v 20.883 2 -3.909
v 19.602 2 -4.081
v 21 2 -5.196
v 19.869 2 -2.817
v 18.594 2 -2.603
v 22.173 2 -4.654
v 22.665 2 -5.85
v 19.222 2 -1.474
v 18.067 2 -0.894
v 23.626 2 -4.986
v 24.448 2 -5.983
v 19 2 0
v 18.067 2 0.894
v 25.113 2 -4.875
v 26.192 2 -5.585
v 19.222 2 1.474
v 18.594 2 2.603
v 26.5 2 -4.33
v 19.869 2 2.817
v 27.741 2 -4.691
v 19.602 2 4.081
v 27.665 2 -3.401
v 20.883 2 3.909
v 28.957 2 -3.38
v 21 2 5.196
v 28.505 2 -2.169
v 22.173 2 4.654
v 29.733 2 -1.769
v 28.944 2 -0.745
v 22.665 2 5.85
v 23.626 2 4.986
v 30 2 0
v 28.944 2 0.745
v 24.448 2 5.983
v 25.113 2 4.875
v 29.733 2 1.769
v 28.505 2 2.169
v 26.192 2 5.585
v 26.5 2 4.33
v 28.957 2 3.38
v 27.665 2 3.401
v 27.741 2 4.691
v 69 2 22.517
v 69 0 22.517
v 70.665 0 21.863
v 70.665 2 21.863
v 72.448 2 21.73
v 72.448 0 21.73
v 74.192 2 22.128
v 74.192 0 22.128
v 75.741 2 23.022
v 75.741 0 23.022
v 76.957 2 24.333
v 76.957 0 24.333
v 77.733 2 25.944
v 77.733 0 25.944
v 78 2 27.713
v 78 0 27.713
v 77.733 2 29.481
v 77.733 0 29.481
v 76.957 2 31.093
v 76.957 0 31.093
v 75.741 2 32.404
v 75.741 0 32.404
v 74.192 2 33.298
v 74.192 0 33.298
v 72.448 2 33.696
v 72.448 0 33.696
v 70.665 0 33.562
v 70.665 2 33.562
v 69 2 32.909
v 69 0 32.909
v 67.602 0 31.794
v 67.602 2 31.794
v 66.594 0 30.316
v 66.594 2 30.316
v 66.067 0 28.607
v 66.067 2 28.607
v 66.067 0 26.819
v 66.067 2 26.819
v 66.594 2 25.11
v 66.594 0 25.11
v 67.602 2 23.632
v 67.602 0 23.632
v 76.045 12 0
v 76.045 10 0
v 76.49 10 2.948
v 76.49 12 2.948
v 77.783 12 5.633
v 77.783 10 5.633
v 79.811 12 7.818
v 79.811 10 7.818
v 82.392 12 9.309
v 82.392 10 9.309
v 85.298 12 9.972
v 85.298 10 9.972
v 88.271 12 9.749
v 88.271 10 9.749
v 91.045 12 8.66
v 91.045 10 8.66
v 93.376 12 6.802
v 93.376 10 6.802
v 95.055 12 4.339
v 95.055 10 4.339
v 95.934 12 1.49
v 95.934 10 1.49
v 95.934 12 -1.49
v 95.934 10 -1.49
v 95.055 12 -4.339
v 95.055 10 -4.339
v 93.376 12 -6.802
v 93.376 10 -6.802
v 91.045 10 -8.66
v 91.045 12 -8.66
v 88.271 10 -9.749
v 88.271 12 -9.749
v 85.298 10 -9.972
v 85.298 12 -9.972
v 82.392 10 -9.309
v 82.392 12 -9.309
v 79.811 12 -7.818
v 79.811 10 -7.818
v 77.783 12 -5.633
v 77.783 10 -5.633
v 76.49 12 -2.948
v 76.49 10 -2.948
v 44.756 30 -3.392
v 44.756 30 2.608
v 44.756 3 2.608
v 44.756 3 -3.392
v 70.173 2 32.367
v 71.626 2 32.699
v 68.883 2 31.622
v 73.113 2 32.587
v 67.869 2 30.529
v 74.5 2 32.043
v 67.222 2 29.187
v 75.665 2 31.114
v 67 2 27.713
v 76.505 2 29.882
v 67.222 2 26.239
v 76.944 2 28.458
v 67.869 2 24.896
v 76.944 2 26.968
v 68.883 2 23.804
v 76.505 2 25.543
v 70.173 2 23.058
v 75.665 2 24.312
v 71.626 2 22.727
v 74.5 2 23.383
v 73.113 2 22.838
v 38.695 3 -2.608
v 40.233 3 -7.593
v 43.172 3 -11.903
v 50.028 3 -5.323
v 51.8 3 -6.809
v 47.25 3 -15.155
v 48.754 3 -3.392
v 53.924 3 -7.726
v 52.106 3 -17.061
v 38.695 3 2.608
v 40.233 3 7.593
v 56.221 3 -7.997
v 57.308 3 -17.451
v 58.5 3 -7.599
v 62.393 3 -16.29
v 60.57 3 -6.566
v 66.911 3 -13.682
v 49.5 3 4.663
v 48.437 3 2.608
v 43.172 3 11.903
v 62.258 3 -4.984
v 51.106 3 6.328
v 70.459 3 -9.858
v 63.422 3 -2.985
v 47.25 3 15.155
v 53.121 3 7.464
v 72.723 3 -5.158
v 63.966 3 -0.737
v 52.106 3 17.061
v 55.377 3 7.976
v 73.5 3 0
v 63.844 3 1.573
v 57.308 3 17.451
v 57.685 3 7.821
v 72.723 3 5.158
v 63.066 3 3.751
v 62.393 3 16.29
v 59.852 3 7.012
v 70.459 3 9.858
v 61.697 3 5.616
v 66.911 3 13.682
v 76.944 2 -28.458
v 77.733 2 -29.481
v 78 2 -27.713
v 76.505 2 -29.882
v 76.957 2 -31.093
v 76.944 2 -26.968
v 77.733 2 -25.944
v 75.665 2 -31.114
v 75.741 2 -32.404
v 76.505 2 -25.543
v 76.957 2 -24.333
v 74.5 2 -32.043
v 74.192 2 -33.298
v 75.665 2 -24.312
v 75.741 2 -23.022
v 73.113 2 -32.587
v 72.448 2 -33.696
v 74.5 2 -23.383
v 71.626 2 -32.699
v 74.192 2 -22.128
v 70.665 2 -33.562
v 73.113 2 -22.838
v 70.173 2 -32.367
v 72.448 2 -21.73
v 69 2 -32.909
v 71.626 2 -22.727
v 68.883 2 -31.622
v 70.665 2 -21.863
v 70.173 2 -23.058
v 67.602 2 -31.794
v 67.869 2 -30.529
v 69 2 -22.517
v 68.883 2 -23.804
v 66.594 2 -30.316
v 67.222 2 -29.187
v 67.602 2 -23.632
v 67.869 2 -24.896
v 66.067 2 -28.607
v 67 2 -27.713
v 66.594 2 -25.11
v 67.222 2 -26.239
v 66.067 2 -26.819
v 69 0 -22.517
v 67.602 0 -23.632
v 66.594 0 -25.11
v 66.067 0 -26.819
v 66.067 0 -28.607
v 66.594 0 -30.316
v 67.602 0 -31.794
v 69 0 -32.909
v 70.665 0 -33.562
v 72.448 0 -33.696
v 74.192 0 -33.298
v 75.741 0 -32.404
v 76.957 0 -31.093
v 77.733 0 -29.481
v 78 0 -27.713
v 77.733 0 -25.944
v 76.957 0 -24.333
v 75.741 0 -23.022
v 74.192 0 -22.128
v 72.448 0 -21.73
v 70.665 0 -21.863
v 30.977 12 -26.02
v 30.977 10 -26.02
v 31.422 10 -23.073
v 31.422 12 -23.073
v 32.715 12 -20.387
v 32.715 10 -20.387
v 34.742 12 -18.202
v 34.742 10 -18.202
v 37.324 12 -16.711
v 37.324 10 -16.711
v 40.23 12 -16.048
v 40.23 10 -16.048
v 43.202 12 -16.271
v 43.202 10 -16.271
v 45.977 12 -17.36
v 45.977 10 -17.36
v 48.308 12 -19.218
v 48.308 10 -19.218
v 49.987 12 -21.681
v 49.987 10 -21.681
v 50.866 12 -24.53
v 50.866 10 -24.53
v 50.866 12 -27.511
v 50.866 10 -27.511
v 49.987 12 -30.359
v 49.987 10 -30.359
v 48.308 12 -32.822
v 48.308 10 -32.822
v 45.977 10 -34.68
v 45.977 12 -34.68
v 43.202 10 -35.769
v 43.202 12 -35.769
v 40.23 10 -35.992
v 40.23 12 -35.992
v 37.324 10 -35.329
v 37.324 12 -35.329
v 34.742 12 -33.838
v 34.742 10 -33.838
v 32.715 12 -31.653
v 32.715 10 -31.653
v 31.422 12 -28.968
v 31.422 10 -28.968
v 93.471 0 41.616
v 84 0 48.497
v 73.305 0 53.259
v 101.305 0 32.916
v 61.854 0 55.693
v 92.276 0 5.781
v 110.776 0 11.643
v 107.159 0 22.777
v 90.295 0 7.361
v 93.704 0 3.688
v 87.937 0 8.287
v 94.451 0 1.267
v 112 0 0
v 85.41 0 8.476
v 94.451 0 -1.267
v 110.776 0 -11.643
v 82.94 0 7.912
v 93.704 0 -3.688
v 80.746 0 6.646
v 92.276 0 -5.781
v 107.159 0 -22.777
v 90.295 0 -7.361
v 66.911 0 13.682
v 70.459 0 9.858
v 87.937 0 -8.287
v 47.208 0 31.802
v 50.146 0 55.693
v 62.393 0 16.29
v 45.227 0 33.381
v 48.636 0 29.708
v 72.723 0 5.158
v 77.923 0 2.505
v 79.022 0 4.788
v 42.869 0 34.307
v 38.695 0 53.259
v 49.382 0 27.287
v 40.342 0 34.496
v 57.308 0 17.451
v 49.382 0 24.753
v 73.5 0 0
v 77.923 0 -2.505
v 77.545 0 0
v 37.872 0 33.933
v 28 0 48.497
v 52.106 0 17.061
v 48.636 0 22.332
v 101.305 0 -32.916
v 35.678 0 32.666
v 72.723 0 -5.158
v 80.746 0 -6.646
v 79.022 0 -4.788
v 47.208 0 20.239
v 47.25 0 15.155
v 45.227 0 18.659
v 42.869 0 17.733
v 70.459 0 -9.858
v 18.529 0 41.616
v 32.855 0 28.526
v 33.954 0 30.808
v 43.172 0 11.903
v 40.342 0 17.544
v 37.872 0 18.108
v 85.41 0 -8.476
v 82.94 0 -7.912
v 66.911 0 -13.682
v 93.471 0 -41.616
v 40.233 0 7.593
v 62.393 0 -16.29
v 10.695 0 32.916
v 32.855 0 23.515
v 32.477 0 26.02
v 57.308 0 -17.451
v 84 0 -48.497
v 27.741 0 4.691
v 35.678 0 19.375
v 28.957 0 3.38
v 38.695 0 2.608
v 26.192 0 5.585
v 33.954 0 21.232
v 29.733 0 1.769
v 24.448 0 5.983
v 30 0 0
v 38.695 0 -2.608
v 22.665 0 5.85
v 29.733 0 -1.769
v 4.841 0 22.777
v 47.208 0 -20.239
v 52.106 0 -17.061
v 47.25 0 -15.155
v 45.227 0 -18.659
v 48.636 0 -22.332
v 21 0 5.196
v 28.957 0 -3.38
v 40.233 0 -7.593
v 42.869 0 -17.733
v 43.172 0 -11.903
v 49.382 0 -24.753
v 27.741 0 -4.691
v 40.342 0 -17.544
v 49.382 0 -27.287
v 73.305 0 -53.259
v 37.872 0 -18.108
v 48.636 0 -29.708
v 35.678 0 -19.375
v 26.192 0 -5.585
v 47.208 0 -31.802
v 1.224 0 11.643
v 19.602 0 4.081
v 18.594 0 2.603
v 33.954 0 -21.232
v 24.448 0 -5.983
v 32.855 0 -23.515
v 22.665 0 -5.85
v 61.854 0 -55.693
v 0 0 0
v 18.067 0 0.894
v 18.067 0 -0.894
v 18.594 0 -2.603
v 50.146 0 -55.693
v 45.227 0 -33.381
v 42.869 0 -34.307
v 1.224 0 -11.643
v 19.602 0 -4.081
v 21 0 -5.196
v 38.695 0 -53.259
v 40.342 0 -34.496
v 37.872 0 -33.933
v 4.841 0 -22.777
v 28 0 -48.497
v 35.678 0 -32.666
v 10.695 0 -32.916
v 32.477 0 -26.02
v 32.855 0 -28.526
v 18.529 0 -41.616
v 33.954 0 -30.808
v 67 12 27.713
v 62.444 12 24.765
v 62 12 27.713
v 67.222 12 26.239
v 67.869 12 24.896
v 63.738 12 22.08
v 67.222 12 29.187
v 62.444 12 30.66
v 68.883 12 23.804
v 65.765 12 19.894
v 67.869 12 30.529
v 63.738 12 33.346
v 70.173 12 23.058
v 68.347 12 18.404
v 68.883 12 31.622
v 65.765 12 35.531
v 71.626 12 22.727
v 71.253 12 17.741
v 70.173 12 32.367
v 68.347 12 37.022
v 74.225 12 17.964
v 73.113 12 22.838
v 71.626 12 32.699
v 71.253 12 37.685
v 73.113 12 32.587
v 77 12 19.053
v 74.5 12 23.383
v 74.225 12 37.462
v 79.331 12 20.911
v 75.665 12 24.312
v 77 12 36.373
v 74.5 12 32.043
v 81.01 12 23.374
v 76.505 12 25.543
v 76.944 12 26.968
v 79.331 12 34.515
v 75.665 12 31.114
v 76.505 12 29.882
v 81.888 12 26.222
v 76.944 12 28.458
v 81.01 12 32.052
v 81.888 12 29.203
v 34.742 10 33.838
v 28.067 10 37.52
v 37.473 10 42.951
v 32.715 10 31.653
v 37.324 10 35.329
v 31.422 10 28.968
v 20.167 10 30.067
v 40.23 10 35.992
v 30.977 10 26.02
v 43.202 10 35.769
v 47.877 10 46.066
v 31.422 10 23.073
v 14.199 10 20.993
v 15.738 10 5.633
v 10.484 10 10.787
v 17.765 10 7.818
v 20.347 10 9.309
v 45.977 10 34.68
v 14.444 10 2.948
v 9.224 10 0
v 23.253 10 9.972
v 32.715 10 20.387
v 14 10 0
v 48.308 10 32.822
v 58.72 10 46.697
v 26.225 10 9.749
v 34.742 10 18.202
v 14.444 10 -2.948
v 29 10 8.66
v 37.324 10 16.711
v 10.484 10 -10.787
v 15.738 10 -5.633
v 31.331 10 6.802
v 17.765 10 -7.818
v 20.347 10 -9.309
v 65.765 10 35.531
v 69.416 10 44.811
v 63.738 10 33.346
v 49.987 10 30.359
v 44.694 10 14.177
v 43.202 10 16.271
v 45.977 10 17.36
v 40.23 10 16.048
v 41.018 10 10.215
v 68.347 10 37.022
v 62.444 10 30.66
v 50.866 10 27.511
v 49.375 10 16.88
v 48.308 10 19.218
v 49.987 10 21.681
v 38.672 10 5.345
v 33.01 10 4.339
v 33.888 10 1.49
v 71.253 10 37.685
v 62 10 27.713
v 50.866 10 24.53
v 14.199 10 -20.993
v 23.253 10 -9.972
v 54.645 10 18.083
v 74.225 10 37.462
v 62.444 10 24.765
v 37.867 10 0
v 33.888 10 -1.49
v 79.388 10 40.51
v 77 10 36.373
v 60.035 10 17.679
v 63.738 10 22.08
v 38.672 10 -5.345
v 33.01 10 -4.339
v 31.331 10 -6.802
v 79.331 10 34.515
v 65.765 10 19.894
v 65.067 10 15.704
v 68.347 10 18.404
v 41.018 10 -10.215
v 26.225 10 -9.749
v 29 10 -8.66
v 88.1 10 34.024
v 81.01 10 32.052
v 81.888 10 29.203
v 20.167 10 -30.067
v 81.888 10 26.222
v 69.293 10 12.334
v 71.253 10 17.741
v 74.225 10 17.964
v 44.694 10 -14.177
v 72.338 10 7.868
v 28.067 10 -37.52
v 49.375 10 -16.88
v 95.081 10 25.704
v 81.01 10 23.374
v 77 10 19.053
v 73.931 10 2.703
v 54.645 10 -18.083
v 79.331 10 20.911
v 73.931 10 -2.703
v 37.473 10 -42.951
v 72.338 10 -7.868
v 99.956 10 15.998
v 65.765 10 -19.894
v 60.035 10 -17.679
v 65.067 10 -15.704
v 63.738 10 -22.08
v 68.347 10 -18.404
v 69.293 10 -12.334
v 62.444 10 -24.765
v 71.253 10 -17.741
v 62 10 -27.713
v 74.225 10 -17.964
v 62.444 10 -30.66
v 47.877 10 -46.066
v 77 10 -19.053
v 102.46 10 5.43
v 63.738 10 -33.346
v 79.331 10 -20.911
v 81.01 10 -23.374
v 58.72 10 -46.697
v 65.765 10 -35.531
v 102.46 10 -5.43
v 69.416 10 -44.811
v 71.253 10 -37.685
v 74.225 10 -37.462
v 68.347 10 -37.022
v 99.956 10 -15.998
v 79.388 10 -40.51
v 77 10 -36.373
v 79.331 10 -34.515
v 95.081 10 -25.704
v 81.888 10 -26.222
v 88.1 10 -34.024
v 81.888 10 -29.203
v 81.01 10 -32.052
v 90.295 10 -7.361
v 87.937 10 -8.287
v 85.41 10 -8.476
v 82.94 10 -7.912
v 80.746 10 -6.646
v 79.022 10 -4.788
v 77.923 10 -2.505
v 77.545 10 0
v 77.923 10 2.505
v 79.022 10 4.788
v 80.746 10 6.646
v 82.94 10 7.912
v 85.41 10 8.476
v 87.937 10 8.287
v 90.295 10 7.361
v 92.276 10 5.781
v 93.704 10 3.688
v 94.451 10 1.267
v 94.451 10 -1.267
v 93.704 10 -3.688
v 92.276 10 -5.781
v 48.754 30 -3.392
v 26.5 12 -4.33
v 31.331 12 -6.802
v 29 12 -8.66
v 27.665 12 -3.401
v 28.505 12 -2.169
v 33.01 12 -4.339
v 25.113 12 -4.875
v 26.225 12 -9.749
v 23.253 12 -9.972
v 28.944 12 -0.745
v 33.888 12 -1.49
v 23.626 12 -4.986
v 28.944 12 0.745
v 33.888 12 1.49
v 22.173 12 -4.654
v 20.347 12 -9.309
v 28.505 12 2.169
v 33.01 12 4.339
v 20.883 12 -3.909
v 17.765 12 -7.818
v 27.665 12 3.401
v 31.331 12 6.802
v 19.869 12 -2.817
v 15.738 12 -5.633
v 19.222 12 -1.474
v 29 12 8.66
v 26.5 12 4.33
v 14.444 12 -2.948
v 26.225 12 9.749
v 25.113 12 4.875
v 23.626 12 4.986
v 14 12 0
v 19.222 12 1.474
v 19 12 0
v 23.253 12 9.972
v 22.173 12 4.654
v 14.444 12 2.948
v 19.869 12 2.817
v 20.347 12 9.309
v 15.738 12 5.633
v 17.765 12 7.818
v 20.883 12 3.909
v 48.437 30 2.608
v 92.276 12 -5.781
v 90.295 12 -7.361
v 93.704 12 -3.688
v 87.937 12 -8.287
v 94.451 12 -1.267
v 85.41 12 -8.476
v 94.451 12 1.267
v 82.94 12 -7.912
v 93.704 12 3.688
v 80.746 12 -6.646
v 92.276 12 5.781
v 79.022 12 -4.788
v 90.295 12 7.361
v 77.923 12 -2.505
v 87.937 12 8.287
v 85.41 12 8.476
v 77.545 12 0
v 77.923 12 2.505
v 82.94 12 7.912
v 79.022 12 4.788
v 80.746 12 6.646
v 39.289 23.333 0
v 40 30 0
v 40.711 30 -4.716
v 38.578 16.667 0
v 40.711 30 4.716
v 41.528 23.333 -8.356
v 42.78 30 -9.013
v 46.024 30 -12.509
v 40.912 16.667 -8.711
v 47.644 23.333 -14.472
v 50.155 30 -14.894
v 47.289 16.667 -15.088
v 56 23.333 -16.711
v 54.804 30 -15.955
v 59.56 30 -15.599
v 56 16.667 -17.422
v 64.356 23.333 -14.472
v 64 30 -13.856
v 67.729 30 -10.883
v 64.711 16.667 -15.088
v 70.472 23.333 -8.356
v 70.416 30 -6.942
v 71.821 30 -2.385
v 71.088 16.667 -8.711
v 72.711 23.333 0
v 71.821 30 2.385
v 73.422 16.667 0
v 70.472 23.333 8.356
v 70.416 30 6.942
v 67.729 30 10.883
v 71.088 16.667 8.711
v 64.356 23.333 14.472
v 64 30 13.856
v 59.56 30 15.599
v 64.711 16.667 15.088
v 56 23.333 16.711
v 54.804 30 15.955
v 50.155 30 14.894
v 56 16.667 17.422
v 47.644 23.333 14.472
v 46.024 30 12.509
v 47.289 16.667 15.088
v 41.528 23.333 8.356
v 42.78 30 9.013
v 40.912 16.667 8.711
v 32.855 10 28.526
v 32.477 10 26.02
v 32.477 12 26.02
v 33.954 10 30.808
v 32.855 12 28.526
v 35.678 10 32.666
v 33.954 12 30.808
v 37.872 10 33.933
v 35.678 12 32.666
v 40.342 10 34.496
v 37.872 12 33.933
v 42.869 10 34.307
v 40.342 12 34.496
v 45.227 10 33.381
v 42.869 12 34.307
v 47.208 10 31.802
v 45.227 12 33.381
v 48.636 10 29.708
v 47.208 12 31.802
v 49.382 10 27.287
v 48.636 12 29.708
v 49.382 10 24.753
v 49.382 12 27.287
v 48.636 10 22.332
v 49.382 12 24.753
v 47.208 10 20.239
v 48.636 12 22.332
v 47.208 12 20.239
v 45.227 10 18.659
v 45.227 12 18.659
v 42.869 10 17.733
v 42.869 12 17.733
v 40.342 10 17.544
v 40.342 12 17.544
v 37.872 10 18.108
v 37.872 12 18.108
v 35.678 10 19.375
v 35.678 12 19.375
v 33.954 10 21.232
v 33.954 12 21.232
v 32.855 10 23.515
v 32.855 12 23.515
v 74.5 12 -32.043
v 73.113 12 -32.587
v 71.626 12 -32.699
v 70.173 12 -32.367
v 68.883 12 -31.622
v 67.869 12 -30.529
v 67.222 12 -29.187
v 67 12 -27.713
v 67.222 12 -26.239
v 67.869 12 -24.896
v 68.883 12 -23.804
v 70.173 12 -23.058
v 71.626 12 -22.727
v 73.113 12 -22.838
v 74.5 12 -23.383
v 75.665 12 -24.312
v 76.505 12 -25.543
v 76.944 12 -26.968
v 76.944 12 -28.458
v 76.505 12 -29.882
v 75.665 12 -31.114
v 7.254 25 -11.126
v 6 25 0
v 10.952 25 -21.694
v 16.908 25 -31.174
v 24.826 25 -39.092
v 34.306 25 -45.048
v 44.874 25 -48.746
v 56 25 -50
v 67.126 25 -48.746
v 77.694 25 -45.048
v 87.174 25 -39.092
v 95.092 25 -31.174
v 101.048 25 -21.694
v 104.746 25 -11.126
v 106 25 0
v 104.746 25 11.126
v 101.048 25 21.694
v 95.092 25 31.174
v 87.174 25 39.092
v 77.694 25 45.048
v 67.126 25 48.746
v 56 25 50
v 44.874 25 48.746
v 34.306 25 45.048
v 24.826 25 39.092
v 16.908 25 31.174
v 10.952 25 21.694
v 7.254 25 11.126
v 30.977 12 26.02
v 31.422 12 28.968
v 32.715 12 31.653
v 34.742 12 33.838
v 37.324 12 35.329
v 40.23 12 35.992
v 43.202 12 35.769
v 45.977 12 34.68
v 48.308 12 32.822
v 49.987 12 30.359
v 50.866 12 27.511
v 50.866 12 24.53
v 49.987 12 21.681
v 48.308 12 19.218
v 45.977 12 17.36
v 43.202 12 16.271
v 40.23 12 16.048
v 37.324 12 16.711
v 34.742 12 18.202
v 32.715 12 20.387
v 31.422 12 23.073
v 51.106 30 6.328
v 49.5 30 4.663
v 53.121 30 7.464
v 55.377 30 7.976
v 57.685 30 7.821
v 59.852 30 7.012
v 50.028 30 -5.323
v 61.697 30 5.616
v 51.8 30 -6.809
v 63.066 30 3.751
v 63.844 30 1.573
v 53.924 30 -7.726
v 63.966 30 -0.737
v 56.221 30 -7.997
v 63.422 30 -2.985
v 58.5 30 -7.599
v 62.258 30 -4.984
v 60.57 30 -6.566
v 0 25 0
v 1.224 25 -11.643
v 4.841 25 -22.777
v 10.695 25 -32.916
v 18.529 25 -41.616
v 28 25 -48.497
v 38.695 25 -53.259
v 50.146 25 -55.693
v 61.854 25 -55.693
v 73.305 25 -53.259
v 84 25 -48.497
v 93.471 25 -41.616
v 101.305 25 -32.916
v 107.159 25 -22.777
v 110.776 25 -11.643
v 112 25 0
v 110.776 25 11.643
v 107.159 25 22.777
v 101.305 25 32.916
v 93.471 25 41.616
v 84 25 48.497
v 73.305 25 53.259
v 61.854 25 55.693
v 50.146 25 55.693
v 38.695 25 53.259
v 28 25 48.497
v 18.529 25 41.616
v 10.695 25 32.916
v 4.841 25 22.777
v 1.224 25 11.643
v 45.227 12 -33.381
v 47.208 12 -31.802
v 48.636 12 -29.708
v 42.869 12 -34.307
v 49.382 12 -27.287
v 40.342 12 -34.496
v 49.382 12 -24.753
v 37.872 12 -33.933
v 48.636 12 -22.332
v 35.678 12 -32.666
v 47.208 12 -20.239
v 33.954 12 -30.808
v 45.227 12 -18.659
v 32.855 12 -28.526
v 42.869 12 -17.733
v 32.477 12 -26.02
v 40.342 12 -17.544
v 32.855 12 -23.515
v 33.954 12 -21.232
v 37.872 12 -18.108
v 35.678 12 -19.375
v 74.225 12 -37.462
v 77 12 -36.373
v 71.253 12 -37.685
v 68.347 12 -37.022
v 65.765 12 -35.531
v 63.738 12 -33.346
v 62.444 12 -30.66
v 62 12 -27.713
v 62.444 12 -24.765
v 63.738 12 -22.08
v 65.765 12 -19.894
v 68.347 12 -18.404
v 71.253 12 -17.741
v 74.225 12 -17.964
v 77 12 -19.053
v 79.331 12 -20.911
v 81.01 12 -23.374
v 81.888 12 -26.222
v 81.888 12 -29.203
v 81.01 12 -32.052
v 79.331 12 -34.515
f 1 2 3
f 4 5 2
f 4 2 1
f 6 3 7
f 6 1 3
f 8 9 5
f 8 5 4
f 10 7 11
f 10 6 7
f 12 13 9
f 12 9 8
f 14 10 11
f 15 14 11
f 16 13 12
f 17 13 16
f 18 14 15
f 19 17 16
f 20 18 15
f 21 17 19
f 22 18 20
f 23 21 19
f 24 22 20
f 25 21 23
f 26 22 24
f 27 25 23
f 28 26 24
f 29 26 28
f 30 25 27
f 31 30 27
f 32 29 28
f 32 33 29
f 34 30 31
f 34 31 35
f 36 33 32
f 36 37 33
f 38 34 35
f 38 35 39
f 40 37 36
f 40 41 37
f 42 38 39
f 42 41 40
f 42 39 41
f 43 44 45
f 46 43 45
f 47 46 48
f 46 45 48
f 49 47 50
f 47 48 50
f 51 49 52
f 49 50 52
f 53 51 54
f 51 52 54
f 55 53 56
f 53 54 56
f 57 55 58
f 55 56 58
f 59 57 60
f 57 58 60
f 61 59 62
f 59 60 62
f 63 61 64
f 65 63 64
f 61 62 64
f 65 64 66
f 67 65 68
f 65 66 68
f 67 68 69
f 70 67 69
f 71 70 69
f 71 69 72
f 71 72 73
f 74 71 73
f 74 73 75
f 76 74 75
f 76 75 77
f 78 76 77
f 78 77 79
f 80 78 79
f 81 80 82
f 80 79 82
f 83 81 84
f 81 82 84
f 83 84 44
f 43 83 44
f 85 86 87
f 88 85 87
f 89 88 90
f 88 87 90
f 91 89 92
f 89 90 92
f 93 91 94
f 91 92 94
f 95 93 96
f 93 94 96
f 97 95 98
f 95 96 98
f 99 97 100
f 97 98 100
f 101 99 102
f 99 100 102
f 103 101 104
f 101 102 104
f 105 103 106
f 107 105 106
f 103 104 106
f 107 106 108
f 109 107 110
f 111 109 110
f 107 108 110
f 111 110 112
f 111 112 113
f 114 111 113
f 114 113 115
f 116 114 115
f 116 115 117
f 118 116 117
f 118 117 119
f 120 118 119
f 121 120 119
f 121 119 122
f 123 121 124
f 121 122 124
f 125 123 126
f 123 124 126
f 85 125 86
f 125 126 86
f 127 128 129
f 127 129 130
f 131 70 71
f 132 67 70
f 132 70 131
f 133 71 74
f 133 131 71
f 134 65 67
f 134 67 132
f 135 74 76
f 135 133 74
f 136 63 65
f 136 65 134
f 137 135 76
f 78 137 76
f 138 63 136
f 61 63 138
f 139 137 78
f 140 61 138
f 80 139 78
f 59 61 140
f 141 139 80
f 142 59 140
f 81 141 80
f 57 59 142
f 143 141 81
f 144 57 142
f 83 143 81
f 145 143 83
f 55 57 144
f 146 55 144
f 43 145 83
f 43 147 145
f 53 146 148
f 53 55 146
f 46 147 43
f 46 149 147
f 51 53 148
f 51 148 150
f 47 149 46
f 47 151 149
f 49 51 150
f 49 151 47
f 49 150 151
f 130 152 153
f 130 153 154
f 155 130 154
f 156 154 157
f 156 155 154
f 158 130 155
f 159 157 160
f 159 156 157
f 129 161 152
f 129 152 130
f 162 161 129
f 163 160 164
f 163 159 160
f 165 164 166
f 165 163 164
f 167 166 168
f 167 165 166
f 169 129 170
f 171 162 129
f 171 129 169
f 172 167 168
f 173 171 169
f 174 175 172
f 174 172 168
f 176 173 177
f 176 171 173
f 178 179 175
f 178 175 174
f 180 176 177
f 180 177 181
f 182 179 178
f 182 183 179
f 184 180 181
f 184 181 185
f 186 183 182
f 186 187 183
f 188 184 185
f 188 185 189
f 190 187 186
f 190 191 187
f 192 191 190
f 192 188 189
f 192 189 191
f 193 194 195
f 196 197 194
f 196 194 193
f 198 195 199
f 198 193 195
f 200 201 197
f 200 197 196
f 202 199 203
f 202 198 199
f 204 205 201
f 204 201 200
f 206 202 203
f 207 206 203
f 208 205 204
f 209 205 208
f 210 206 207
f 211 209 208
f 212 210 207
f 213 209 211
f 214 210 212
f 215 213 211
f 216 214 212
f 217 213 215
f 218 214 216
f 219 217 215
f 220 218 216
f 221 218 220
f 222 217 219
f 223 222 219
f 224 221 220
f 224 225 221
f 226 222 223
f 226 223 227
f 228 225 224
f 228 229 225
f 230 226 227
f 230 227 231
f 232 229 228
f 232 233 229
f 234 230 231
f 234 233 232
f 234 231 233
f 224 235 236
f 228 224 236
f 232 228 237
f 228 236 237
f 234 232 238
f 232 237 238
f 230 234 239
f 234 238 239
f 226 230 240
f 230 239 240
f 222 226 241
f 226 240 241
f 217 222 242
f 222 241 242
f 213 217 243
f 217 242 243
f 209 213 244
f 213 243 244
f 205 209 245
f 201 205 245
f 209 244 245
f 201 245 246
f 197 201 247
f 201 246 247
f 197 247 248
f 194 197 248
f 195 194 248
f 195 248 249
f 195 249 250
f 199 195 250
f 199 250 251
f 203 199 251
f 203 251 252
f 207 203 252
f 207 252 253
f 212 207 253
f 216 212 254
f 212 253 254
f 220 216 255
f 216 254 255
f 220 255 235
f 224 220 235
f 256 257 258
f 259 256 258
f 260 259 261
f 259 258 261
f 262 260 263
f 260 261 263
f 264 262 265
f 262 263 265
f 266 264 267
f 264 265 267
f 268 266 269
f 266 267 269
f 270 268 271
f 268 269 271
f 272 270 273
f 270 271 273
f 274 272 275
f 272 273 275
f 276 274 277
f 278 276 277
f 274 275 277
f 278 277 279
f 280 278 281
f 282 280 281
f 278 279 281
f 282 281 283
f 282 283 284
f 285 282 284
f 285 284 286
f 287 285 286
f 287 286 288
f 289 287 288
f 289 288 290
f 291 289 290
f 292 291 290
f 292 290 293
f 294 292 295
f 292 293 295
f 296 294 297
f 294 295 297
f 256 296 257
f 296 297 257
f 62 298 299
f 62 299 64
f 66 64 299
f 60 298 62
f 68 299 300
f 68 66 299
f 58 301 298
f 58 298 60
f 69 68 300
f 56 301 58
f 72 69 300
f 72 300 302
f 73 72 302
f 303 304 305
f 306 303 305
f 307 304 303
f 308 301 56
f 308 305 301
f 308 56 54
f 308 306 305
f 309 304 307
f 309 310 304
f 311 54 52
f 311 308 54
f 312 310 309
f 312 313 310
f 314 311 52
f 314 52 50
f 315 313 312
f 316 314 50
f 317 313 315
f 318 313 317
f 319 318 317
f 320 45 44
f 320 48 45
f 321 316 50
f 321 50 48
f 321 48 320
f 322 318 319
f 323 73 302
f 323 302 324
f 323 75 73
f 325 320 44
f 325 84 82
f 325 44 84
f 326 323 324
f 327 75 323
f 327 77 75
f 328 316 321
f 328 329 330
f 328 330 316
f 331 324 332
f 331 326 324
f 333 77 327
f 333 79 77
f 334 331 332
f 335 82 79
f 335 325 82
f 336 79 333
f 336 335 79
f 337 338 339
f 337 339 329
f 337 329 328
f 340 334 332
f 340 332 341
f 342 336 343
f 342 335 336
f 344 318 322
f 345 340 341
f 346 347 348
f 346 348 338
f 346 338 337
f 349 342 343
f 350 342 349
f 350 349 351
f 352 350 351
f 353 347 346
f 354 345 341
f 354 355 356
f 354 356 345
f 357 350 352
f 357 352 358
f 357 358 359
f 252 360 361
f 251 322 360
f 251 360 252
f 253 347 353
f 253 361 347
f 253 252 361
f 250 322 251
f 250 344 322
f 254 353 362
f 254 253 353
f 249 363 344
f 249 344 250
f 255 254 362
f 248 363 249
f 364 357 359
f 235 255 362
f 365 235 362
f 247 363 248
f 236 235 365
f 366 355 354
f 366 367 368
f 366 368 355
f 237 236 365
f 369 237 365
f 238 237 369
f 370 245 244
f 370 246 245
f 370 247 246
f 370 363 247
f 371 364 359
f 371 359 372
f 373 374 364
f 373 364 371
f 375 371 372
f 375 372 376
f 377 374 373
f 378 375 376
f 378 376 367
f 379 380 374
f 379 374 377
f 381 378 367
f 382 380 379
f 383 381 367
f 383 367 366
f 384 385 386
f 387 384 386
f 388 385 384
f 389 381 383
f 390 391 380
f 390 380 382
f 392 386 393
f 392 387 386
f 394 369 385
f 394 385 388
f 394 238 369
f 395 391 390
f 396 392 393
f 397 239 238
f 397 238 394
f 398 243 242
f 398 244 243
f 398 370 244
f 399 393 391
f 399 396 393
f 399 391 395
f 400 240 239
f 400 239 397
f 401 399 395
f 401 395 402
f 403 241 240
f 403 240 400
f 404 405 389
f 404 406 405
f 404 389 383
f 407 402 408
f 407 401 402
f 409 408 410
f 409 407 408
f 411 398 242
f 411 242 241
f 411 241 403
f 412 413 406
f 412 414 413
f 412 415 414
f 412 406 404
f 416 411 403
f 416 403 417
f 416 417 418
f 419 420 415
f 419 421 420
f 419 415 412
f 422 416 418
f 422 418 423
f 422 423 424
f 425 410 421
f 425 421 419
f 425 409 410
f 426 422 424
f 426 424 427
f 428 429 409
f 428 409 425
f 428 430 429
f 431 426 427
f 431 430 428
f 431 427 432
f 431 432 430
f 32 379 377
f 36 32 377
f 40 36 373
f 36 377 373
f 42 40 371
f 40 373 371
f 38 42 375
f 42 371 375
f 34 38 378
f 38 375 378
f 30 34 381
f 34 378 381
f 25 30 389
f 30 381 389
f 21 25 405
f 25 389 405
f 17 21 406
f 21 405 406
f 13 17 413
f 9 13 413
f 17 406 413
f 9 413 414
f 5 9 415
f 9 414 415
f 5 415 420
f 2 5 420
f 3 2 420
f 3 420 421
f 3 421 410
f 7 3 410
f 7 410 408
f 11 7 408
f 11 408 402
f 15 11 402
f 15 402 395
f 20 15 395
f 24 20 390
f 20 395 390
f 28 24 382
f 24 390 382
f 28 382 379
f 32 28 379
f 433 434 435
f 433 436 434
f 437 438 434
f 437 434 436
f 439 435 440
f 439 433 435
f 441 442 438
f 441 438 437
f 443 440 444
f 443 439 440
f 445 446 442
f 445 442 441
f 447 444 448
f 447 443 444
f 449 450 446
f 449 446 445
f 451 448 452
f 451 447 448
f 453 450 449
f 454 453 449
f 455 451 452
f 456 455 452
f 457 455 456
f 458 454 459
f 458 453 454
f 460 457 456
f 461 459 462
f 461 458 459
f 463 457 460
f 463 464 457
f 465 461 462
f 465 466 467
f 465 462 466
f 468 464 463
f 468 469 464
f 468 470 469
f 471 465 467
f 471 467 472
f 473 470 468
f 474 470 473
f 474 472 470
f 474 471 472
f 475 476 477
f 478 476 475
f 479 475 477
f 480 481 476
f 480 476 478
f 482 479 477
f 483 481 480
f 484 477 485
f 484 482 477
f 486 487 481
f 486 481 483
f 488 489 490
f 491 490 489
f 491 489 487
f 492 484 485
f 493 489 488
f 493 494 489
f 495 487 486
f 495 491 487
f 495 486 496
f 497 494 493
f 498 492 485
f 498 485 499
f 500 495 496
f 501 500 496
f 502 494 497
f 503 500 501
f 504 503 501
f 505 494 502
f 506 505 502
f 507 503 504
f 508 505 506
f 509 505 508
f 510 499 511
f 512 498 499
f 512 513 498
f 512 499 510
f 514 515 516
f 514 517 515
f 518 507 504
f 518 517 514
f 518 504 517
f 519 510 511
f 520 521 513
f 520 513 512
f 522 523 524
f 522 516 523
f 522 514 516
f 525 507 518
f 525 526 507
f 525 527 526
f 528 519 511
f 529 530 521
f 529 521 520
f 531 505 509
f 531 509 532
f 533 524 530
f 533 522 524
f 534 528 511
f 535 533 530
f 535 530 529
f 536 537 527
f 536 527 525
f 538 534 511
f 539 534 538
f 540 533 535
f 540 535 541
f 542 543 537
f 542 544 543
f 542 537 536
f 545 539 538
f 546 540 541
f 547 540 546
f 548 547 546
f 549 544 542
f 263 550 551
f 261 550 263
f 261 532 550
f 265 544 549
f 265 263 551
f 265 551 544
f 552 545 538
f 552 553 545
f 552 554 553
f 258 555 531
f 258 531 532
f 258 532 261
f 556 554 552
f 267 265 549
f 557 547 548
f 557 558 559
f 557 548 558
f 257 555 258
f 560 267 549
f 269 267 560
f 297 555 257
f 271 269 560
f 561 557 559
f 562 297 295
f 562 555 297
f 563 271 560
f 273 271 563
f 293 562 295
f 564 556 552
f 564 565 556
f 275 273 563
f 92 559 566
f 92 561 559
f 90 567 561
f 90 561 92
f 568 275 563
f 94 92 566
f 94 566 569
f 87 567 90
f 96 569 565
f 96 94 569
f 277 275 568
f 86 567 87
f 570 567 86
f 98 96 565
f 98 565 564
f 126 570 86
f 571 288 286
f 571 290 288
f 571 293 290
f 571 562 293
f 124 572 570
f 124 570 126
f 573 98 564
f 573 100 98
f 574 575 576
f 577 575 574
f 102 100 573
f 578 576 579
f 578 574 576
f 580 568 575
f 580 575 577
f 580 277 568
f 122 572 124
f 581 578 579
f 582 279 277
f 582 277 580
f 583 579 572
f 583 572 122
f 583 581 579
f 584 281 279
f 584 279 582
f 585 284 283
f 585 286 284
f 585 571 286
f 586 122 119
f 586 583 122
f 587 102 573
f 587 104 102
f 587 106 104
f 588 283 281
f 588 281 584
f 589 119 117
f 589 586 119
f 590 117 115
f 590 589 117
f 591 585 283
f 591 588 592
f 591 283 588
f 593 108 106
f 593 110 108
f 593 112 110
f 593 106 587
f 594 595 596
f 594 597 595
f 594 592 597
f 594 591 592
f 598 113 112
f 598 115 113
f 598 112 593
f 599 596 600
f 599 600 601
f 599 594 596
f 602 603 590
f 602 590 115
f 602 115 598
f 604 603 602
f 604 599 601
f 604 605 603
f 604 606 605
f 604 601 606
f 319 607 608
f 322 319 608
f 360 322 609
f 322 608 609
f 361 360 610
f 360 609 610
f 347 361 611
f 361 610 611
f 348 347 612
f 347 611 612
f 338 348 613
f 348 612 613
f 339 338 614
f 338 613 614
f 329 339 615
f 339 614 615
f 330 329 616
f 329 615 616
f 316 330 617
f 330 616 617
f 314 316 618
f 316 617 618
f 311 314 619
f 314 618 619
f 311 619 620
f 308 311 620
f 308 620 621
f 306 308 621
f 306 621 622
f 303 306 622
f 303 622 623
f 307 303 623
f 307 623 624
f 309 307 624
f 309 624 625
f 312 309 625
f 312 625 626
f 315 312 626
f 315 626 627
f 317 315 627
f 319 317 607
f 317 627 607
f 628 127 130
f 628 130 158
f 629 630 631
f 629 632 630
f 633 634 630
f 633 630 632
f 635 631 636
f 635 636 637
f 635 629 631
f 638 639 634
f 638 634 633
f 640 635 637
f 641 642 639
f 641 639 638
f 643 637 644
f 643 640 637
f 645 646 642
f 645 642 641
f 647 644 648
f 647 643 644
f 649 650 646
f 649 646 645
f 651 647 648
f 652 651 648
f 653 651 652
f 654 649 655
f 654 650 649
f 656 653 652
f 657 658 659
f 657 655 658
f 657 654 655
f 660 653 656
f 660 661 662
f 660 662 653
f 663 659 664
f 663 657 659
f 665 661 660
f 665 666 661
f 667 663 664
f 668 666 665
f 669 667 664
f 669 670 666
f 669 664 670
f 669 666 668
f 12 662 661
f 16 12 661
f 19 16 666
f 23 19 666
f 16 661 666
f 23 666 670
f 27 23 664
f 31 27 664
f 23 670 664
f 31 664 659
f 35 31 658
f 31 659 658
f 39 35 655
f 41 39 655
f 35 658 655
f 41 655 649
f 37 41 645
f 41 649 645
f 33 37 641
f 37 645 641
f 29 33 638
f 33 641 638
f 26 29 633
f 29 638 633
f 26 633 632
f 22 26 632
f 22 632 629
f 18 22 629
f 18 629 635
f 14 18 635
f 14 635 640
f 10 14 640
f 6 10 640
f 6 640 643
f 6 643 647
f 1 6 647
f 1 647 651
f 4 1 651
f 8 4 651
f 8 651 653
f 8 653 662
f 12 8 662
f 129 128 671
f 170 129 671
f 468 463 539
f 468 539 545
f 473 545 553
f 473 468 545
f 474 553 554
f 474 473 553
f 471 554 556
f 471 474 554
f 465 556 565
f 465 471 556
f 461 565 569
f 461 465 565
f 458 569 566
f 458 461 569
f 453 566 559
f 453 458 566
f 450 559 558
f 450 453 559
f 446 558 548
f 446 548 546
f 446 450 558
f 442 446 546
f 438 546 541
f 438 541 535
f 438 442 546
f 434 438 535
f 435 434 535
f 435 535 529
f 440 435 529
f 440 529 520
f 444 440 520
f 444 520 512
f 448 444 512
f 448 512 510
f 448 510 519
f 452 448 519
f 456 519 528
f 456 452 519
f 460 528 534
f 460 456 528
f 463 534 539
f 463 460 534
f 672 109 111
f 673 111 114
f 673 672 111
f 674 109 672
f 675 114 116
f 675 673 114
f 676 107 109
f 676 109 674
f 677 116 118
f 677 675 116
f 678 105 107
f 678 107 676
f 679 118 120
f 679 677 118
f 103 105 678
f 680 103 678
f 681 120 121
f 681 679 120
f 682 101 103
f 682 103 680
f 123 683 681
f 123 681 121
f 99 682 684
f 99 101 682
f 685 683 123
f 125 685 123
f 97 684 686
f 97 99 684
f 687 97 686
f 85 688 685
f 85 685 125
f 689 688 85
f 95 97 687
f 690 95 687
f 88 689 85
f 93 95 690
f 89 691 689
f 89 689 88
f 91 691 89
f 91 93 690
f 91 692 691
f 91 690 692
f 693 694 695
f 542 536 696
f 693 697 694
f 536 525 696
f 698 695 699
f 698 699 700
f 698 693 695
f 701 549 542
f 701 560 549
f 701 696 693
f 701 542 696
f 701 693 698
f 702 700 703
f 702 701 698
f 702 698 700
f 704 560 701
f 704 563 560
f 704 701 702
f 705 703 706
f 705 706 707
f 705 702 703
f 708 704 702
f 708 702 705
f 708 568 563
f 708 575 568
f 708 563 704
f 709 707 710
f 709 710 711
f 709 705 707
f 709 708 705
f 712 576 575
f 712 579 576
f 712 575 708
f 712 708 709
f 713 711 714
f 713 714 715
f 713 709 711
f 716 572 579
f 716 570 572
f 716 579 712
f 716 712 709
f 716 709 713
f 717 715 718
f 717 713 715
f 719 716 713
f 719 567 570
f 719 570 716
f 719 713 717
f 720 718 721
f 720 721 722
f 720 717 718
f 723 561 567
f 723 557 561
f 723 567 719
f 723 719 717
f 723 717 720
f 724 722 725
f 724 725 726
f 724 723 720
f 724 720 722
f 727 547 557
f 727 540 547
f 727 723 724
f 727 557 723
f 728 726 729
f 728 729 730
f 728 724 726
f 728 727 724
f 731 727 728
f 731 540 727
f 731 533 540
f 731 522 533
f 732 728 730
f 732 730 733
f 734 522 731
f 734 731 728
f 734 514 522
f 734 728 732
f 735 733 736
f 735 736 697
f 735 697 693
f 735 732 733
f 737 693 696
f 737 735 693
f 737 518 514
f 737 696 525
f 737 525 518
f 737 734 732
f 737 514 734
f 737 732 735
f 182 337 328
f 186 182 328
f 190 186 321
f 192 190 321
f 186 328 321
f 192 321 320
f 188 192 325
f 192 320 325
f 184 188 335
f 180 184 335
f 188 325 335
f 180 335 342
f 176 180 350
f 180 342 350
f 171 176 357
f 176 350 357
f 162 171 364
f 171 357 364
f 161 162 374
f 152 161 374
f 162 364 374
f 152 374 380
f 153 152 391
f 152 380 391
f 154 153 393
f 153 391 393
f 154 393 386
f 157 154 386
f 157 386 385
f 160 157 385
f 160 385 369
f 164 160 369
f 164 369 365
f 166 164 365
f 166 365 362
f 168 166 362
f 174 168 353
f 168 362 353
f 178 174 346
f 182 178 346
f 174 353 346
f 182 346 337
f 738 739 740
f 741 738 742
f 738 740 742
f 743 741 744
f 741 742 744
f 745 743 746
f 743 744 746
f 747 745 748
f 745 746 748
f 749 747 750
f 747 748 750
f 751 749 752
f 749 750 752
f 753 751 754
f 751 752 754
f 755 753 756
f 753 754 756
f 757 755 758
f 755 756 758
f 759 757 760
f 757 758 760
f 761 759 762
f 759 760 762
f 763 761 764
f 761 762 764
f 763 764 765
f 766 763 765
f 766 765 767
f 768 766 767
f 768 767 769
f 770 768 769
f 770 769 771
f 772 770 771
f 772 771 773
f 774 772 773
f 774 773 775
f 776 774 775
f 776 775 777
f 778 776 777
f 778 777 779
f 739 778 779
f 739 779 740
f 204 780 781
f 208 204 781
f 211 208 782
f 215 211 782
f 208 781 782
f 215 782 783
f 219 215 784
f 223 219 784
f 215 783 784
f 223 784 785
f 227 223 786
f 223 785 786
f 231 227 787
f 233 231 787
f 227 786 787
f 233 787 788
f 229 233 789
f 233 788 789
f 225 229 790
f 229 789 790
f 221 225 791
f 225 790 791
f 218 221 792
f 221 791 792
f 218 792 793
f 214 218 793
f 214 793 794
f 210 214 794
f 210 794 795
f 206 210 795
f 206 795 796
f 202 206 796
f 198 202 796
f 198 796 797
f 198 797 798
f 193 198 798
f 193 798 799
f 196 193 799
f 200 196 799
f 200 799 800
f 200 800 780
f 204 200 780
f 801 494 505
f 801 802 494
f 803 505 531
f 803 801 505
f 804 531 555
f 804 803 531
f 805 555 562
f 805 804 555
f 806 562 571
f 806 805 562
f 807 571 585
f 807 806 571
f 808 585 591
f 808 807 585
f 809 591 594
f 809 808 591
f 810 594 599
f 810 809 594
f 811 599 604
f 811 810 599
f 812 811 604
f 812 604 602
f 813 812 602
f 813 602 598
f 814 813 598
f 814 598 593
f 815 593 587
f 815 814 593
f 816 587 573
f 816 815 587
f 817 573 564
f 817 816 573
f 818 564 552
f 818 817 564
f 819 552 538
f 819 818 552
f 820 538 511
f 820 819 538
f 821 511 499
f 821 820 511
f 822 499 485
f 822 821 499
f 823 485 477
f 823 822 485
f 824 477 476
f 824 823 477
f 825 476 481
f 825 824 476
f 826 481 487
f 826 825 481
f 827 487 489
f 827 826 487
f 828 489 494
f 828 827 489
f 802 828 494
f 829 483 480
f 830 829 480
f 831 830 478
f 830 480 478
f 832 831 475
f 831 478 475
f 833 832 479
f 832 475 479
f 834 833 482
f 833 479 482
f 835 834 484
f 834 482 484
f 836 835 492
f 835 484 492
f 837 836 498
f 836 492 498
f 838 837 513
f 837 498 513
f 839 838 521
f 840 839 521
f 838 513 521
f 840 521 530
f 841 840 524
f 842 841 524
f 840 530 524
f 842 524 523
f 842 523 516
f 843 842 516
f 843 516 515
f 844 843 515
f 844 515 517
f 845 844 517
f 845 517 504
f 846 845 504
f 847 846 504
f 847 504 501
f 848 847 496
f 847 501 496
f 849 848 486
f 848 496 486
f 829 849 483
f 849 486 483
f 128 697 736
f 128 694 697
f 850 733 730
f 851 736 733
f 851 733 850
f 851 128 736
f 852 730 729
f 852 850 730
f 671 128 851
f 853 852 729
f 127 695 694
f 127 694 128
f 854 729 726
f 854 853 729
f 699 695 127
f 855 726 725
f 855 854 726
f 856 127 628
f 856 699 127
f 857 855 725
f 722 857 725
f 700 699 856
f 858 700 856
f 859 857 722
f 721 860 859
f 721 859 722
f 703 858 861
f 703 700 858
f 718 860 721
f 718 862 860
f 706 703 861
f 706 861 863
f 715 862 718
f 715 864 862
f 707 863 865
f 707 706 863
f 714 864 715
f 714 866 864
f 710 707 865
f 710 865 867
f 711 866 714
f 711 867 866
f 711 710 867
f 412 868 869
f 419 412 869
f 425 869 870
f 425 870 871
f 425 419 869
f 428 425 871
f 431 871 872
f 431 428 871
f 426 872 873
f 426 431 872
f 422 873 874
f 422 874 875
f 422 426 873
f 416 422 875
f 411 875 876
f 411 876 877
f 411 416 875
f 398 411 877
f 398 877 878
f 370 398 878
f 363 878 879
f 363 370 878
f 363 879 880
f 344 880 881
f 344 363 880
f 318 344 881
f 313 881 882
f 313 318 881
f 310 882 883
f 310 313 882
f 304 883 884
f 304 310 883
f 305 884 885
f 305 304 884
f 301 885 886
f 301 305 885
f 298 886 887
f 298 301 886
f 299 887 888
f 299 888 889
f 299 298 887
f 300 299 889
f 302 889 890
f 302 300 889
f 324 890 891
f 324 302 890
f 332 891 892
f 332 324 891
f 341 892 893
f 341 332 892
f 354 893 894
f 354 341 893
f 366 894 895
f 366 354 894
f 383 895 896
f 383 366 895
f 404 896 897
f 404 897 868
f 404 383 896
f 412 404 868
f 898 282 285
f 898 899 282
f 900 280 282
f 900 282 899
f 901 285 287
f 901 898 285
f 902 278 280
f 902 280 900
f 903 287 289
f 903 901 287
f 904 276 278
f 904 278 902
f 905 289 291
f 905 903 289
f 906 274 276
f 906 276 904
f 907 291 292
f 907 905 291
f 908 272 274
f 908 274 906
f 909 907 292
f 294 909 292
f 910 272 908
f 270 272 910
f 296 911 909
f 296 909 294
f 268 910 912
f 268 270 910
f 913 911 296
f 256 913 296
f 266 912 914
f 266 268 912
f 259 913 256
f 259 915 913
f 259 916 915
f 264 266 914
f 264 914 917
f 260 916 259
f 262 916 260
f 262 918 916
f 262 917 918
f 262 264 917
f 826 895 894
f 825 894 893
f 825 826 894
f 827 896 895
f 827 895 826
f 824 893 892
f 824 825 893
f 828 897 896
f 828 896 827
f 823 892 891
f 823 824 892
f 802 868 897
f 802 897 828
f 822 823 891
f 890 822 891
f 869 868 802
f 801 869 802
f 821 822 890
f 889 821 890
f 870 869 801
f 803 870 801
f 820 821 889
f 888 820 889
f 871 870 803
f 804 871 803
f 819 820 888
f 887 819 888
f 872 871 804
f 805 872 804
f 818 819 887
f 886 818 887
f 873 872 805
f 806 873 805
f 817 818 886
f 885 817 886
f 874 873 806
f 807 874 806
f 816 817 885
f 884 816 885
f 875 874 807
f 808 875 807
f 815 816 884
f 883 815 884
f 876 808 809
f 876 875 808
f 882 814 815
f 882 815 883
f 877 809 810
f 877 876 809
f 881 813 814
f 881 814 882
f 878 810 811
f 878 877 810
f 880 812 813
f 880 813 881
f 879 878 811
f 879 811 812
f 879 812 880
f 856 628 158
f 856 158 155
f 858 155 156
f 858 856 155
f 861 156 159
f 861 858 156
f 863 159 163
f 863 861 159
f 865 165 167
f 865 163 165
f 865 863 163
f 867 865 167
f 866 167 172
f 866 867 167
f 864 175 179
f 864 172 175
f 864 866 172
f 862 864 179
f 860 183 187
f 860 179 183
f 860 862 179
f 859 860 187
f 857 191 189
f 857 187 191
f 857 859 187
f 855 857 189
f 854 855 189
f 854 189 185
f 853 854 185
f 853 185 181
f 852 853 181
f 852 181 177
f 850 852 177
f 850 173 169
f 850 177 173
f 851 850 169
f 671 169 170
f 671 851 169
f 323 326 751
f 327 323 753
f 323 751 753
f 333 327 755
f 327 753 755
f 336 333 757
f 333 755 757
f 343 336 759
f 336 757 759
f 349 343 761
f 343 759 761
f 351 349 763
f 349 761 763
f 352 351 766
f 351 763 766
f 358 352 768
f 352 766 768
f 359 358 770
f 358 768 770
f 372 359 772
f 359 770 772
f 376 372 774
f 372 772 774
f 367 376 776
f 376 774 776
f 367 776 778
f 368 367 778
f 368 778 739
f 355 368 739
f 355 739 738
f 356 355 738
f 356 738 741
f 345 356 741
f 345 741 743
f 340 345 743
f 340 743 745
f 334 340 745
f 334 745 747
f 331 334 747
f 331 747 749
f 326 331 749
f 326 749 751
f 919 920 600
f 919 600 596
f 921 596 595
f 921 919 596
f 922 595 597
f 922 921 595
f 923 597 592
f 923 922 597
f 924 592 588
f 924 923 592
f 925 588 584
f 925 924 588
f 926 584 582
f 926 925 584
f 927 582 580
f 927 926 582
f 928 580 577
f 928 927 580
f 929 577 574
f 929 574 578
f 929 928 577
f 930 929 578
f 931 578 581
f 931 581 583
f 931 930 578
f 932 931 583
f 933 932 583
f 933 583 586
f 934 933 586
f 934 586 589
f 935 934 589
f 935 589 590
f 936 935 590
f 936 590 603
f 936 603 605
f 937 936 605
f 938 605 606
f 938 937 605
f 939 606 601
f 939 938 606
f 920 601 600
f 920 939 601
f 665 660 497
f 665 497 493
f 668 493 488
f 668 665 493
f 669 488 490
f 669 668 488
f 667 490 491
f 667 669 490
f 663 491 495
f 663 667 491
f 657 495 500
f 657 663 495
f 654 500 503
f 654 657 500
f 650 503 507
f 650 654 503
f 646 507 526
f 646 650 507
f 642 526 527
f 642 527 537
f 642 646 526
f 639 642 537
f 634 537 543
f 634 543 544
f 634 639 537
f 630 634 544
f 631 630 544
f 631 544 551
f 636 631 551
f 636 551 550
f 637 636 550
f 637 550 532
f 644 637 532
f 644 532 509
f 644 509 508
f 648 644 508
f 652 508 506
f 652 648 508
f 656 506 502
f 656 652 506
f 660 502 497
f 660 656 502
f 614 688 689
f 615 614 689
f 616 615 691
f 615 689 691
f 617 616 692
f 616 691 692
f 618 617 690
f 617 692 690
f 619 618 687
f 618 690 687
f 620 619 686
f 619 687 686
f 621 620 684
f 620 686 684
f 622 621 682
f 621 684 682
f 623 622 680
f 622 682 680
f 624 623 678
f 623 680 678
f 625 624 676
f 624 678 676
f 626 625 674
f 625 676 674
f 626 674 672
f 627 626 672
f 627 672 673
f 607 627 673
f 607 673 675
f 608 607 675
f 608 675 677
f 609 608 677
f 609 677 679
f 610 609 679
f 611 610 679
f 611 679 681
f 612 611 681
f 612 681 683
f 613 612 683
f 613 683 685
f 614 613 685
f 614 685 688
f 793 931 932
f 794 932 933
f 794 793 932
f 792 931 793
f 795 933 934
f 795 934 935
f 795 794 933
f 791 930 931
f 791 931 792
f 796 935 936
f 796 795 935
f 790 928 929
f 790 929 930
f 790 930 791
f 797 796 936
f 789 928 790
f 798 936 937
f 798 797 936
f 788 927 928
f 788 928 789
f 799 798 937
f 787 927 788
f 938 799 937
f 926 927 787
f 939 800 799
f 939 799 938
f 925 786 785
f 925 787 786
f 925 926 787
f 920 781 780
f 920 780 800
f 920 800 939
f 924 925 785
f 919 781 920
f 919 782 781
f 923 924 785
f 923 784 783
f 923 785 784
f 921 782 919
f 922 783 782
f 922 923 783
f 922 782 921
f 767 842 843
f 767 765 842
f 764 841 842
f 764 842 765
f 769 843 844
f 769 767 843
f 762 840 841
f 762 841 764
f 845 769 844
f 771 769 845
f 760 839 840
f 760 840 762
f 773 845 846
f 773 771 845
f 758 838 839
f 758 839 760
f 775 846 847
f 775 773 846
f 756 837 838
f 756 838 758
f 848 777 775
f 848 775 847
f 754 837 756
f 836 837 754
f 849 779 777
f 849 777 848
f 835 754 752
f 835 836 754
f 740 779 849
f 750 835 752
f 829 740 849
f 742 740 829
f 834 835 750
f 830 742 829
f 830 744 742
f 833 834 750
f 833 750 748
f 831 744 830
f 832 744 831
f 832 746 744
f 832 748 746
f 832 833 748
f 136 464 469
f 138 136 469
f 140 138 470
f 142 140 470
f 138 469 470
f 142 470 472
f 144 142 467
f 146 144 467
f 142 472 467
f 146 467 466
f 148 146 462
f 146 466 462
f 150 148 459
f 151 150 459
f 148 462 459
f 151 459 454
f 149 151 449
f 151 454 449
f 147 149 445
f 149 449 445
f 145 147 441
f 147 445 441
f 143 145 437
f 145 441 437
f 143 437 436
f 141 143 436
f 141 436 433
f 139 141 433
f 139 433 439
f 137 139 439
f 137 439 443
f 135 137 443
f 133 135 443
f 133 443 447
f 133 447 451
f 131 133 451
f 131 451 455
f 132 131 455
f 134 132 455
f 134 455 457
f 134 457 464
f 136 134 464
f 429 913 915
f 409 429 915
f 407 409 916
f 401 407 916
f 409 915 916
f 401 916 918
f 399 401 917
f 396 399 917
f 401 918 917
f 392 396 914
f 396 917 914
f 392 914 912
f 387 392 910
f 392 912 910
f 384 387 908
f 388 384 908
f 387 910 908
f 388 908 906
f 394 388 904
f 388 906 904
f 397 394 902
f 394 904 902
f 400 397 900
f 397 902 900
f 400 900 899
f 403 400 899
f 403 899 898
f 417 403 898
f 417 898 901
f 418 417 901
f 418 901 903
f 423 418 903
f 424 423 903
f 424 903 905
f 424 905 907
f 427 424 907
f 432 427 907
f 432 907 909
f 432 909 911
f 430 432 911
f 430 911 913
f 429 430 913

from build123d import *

# Parameters (mm, degrees)
ESBO_O2_R                = 5
CORTE_EXTRUS_O2_DEPTH    = 30
PADR_OCIRCULAR1_COUNT    = 3
ESBO_O6_R                = 6
CORTE_EXTRUS_O5_DEPTH    = 2
PADR_OCIRCULAR4_COUNT    = 3
ESBO_O9_W                = 3.998230439
ESBO_O9_H                = 6
CORTE_EXTRUS_O6_DEPTH    = 129.763348823
ESBO_O10_R               = 8.5
CORTE_EXTRUS_O7_DEPTH    = 10
PADR_OCIRCULAR5_COUNT    = 3
ESBO_O11_R               = 10
RESSALTO_EXTRUS_O1_DEPTH = 2
CORTE_EXTRUS_O9_START    = 2
ESBO_O12_R               = 8.5
CORTE_EXTRUS_O9_DEPTH    = 2
RESSALTO_EXTRUS_O2_START = 2
ESBO_O13_R               = 10
ESBO_O13_R_2             = 5
RESSALTO_EXTRUS_O2_DEPTH = 2
PADR_OCIRCULAR6_COUNT    = 3
ESBO_O14_R               = 17.5
CORTE_EXTRUS_O10_DEPTH   = 3


with BuildPart() as part:
    # Esboço1 → Revolução1 (revolve)
    with BuildSketch(Plane.XY):
        Polygon((0, 0), (48, 0), (48, 30), (40, 30), (37.866686426, 10), (32.866686426, 10), (14.223529412, 10), (9.223529412, 10), (6, 25), (0, 25), align=None)
    revolve(axis=Axis((56, 30, 0), (0, -1, 0)))

    # Esboço2 → Corte-extrusão2 (cut)
    with BuildSketch(Plane(origin=(0, 10, 0), x_dir=(1, 0, 0), z_dir=(0, 1, 0))):
        with Locations(Location((24, 0, 0), (0, 0, 180))):
            Circle(ESBO_O2_R)
    corte_extrus_o2 = extrude(amount=-CORTE_EXTRUS_O2_DEPTH, mode=Mode.SUBTRACT)

    # PadrãoCircular1: Corte-extrusão2 ×3 about axis
    padr_ocircular1_axis = Axis((56, 0, 0), (0, 1, 0))
    for i in range(1, PADR_OCIRCULAR1_COUNT):
        add(corte_extrus_o2.rotate(padr_ocircular1_axis, i * 360 / PADR_OCIRCULAR1_COUNT), mode=Mode.SUBTRACT)

    # Esboço6 → Corte-extrusão5 (cut)
    with BuildSketch(Plane.XZ):
        with Locations((24, 0)):
            Circle(ESBO_O6_R)
    corte_extrus_o5 = extrude(amount=-CORTE_EXTRUS_O5_DEPTH, mode=Mode.SUBTRACT)

    # PadrãoCircular4: Corte-extrusão5 ×3 about axis
    padr_ocircular4_axis = Axis((56, 0, 0), (0, 1, 0))
    for i in range(1, PADR_OCIRCULAR4_COUNT):
        add(corte_extrus_o5.rotate(padr_ocircular4_axis, i * 360 / PADR_OCIRCULAR4_COUNT), mode=Mode.SUBTRACT)

    # Esboço9 → Corte-extrusão6 (cut, through all)
    with BuildSketch(Plane(origin=(0, 30, 0), x_dir=(1, 0, 0), z_dir=(0, 1, 0))):
        with Locations((46.755362969, 0.391520848)):
            Rectangle(ESBO_O9_W, ESBO_O9_H)
    extrude(amount=-CORTE_EXTRUS_O6_DEPTH, mode=Mode.SUBTRACT)

    # Esboço10 → Corte-extrusão7 (cut)
    with BuildSketch(Plane(origin=(0, 10, 0), x_dir=(1, 0, 0), z_dir=(0, 1, 0))):
        with Locations(Location((40.977280539, 26.020113375, 0), (0, 0, 180))):
            Circle(ESBO_O10_R)
    corte_extrus_o7 = extrude(amount=-CORTE_EXTRUS_O7_DEPTH, mode=Mode.SUBTRACT)

    # PadrãoCircular5: Corte-extrusão7 ×3 about axis
    padr_ocircular5_axis = Axis((56, 0, 0), (0, 1, 0))
    for i in range(1, PADR_OCIRCULAR5_COUNT):
        add(corte_extrus_o7.rotate(padr_ocircular5_axis, i * 360 / PADR_OCIRCULAR5_COUNT), mode=Mode.SUBTRACT)

    # Esboço11 → Ressalto-extrusão1 (add)
    with BuildSketch(Plane(origin=(0, 10, 0), x_dir=(1, 0, 0), z_dir=(0, 1, 0))):
        with Locations(Location((40.977280539, 26.020113375, 0), (0, 0, 180))):
            Circle(ESBO_O11_R)
        with Locations(Location((86.045438923, 0, 0), (0, 0, 180))):
            Circle(ESBO_O11_R)
        with Locations(Location((40.977280539, -26.020113375, 0), (0, 0, 180))):
            Circle(ESBO_O11_R)
    extrude(amount=RESSALTO_EXTRUS_O1_DEPTH)

    # Esboço12 → Corte-extrusão9 (cut)
    with BuildSketch(Plane(origin=(0, 10, 0), x_dir=(1, 0, 0), z_dir=(0, 1, 0)).offset(CORTE_EXTRUS_O9_START)):
        with Locations(Location((40.977280539, 26.020113375, 0), (0, 0, 180))):
            Circle(ESBO_O12_R)
        with Locations(Location((40.977280539, -26.020113375, 0), (0, 0, 180))):
            Circle(ESBO_O12_R)
        with Locations(Location((86.045438923, 0, 0), (0, 0, 180))):
            Circle(ESBO_O12_R)
    extrude(amount=-CORTE_EXTRUS_O9_DEPTH, mode=Mode.SUBTRACT)

    # Esboço13 → Ressalto-extrusão2 (add)
    with BuildSketch(Plane(origin=(0, 10, 0), x_dir=(1, 0, 0), z_dir=(0, 1, 0)).offset(RESSALTO_EXTRUS_O2_START)):
        with Locations(Location((24, 0, 0), (0, 0, 180))):
            Circle(ESBO_O13_R)
        with Locations(Location((24, 0, 0), (0, 0, 180))):
            Circle(ESBO_O13_R_2, mode=Mode.SUBTRACT)
    ressalto_extrus_o2 = extrude(amount=-RESSALTO_EXTRUS_O2_DEPTH)

    # PadrãoCircular6: Corte-extrusão2, Ressalto-extrusão2 ×3 about axis
    padr_ocircular6_axis = Axis((56, 0, 0), (0, 1, 0))
    add([corte_extrus_o2.rotate(padr_ocircular6_axis, i * 360 / PADR_OCIRCULAR6_COUNT) for i in range(1, PADR_OCIRCULAR6_COUNT)], mode=Mode.SUBTRACT)
    add([ressalto_extrus_o2.rotate(padr_ocircular6_axis, i * 360 / PADR_OCIRCULAR6_COUNT) for i in range(1, PADR_OCIRCULAR6_COUNT)])

    # Esboço14 → Corte-extrusão10 (cut)
    with BuildSketch(Plane.XZ):
        with Locations((56, 0)):
            Circle(ESBO_O14_R)
    extrude(amount=-CORTE_EXTRUS_O10_DEPTH, mode=Mode.SUBTRACT)


solid = part.part
